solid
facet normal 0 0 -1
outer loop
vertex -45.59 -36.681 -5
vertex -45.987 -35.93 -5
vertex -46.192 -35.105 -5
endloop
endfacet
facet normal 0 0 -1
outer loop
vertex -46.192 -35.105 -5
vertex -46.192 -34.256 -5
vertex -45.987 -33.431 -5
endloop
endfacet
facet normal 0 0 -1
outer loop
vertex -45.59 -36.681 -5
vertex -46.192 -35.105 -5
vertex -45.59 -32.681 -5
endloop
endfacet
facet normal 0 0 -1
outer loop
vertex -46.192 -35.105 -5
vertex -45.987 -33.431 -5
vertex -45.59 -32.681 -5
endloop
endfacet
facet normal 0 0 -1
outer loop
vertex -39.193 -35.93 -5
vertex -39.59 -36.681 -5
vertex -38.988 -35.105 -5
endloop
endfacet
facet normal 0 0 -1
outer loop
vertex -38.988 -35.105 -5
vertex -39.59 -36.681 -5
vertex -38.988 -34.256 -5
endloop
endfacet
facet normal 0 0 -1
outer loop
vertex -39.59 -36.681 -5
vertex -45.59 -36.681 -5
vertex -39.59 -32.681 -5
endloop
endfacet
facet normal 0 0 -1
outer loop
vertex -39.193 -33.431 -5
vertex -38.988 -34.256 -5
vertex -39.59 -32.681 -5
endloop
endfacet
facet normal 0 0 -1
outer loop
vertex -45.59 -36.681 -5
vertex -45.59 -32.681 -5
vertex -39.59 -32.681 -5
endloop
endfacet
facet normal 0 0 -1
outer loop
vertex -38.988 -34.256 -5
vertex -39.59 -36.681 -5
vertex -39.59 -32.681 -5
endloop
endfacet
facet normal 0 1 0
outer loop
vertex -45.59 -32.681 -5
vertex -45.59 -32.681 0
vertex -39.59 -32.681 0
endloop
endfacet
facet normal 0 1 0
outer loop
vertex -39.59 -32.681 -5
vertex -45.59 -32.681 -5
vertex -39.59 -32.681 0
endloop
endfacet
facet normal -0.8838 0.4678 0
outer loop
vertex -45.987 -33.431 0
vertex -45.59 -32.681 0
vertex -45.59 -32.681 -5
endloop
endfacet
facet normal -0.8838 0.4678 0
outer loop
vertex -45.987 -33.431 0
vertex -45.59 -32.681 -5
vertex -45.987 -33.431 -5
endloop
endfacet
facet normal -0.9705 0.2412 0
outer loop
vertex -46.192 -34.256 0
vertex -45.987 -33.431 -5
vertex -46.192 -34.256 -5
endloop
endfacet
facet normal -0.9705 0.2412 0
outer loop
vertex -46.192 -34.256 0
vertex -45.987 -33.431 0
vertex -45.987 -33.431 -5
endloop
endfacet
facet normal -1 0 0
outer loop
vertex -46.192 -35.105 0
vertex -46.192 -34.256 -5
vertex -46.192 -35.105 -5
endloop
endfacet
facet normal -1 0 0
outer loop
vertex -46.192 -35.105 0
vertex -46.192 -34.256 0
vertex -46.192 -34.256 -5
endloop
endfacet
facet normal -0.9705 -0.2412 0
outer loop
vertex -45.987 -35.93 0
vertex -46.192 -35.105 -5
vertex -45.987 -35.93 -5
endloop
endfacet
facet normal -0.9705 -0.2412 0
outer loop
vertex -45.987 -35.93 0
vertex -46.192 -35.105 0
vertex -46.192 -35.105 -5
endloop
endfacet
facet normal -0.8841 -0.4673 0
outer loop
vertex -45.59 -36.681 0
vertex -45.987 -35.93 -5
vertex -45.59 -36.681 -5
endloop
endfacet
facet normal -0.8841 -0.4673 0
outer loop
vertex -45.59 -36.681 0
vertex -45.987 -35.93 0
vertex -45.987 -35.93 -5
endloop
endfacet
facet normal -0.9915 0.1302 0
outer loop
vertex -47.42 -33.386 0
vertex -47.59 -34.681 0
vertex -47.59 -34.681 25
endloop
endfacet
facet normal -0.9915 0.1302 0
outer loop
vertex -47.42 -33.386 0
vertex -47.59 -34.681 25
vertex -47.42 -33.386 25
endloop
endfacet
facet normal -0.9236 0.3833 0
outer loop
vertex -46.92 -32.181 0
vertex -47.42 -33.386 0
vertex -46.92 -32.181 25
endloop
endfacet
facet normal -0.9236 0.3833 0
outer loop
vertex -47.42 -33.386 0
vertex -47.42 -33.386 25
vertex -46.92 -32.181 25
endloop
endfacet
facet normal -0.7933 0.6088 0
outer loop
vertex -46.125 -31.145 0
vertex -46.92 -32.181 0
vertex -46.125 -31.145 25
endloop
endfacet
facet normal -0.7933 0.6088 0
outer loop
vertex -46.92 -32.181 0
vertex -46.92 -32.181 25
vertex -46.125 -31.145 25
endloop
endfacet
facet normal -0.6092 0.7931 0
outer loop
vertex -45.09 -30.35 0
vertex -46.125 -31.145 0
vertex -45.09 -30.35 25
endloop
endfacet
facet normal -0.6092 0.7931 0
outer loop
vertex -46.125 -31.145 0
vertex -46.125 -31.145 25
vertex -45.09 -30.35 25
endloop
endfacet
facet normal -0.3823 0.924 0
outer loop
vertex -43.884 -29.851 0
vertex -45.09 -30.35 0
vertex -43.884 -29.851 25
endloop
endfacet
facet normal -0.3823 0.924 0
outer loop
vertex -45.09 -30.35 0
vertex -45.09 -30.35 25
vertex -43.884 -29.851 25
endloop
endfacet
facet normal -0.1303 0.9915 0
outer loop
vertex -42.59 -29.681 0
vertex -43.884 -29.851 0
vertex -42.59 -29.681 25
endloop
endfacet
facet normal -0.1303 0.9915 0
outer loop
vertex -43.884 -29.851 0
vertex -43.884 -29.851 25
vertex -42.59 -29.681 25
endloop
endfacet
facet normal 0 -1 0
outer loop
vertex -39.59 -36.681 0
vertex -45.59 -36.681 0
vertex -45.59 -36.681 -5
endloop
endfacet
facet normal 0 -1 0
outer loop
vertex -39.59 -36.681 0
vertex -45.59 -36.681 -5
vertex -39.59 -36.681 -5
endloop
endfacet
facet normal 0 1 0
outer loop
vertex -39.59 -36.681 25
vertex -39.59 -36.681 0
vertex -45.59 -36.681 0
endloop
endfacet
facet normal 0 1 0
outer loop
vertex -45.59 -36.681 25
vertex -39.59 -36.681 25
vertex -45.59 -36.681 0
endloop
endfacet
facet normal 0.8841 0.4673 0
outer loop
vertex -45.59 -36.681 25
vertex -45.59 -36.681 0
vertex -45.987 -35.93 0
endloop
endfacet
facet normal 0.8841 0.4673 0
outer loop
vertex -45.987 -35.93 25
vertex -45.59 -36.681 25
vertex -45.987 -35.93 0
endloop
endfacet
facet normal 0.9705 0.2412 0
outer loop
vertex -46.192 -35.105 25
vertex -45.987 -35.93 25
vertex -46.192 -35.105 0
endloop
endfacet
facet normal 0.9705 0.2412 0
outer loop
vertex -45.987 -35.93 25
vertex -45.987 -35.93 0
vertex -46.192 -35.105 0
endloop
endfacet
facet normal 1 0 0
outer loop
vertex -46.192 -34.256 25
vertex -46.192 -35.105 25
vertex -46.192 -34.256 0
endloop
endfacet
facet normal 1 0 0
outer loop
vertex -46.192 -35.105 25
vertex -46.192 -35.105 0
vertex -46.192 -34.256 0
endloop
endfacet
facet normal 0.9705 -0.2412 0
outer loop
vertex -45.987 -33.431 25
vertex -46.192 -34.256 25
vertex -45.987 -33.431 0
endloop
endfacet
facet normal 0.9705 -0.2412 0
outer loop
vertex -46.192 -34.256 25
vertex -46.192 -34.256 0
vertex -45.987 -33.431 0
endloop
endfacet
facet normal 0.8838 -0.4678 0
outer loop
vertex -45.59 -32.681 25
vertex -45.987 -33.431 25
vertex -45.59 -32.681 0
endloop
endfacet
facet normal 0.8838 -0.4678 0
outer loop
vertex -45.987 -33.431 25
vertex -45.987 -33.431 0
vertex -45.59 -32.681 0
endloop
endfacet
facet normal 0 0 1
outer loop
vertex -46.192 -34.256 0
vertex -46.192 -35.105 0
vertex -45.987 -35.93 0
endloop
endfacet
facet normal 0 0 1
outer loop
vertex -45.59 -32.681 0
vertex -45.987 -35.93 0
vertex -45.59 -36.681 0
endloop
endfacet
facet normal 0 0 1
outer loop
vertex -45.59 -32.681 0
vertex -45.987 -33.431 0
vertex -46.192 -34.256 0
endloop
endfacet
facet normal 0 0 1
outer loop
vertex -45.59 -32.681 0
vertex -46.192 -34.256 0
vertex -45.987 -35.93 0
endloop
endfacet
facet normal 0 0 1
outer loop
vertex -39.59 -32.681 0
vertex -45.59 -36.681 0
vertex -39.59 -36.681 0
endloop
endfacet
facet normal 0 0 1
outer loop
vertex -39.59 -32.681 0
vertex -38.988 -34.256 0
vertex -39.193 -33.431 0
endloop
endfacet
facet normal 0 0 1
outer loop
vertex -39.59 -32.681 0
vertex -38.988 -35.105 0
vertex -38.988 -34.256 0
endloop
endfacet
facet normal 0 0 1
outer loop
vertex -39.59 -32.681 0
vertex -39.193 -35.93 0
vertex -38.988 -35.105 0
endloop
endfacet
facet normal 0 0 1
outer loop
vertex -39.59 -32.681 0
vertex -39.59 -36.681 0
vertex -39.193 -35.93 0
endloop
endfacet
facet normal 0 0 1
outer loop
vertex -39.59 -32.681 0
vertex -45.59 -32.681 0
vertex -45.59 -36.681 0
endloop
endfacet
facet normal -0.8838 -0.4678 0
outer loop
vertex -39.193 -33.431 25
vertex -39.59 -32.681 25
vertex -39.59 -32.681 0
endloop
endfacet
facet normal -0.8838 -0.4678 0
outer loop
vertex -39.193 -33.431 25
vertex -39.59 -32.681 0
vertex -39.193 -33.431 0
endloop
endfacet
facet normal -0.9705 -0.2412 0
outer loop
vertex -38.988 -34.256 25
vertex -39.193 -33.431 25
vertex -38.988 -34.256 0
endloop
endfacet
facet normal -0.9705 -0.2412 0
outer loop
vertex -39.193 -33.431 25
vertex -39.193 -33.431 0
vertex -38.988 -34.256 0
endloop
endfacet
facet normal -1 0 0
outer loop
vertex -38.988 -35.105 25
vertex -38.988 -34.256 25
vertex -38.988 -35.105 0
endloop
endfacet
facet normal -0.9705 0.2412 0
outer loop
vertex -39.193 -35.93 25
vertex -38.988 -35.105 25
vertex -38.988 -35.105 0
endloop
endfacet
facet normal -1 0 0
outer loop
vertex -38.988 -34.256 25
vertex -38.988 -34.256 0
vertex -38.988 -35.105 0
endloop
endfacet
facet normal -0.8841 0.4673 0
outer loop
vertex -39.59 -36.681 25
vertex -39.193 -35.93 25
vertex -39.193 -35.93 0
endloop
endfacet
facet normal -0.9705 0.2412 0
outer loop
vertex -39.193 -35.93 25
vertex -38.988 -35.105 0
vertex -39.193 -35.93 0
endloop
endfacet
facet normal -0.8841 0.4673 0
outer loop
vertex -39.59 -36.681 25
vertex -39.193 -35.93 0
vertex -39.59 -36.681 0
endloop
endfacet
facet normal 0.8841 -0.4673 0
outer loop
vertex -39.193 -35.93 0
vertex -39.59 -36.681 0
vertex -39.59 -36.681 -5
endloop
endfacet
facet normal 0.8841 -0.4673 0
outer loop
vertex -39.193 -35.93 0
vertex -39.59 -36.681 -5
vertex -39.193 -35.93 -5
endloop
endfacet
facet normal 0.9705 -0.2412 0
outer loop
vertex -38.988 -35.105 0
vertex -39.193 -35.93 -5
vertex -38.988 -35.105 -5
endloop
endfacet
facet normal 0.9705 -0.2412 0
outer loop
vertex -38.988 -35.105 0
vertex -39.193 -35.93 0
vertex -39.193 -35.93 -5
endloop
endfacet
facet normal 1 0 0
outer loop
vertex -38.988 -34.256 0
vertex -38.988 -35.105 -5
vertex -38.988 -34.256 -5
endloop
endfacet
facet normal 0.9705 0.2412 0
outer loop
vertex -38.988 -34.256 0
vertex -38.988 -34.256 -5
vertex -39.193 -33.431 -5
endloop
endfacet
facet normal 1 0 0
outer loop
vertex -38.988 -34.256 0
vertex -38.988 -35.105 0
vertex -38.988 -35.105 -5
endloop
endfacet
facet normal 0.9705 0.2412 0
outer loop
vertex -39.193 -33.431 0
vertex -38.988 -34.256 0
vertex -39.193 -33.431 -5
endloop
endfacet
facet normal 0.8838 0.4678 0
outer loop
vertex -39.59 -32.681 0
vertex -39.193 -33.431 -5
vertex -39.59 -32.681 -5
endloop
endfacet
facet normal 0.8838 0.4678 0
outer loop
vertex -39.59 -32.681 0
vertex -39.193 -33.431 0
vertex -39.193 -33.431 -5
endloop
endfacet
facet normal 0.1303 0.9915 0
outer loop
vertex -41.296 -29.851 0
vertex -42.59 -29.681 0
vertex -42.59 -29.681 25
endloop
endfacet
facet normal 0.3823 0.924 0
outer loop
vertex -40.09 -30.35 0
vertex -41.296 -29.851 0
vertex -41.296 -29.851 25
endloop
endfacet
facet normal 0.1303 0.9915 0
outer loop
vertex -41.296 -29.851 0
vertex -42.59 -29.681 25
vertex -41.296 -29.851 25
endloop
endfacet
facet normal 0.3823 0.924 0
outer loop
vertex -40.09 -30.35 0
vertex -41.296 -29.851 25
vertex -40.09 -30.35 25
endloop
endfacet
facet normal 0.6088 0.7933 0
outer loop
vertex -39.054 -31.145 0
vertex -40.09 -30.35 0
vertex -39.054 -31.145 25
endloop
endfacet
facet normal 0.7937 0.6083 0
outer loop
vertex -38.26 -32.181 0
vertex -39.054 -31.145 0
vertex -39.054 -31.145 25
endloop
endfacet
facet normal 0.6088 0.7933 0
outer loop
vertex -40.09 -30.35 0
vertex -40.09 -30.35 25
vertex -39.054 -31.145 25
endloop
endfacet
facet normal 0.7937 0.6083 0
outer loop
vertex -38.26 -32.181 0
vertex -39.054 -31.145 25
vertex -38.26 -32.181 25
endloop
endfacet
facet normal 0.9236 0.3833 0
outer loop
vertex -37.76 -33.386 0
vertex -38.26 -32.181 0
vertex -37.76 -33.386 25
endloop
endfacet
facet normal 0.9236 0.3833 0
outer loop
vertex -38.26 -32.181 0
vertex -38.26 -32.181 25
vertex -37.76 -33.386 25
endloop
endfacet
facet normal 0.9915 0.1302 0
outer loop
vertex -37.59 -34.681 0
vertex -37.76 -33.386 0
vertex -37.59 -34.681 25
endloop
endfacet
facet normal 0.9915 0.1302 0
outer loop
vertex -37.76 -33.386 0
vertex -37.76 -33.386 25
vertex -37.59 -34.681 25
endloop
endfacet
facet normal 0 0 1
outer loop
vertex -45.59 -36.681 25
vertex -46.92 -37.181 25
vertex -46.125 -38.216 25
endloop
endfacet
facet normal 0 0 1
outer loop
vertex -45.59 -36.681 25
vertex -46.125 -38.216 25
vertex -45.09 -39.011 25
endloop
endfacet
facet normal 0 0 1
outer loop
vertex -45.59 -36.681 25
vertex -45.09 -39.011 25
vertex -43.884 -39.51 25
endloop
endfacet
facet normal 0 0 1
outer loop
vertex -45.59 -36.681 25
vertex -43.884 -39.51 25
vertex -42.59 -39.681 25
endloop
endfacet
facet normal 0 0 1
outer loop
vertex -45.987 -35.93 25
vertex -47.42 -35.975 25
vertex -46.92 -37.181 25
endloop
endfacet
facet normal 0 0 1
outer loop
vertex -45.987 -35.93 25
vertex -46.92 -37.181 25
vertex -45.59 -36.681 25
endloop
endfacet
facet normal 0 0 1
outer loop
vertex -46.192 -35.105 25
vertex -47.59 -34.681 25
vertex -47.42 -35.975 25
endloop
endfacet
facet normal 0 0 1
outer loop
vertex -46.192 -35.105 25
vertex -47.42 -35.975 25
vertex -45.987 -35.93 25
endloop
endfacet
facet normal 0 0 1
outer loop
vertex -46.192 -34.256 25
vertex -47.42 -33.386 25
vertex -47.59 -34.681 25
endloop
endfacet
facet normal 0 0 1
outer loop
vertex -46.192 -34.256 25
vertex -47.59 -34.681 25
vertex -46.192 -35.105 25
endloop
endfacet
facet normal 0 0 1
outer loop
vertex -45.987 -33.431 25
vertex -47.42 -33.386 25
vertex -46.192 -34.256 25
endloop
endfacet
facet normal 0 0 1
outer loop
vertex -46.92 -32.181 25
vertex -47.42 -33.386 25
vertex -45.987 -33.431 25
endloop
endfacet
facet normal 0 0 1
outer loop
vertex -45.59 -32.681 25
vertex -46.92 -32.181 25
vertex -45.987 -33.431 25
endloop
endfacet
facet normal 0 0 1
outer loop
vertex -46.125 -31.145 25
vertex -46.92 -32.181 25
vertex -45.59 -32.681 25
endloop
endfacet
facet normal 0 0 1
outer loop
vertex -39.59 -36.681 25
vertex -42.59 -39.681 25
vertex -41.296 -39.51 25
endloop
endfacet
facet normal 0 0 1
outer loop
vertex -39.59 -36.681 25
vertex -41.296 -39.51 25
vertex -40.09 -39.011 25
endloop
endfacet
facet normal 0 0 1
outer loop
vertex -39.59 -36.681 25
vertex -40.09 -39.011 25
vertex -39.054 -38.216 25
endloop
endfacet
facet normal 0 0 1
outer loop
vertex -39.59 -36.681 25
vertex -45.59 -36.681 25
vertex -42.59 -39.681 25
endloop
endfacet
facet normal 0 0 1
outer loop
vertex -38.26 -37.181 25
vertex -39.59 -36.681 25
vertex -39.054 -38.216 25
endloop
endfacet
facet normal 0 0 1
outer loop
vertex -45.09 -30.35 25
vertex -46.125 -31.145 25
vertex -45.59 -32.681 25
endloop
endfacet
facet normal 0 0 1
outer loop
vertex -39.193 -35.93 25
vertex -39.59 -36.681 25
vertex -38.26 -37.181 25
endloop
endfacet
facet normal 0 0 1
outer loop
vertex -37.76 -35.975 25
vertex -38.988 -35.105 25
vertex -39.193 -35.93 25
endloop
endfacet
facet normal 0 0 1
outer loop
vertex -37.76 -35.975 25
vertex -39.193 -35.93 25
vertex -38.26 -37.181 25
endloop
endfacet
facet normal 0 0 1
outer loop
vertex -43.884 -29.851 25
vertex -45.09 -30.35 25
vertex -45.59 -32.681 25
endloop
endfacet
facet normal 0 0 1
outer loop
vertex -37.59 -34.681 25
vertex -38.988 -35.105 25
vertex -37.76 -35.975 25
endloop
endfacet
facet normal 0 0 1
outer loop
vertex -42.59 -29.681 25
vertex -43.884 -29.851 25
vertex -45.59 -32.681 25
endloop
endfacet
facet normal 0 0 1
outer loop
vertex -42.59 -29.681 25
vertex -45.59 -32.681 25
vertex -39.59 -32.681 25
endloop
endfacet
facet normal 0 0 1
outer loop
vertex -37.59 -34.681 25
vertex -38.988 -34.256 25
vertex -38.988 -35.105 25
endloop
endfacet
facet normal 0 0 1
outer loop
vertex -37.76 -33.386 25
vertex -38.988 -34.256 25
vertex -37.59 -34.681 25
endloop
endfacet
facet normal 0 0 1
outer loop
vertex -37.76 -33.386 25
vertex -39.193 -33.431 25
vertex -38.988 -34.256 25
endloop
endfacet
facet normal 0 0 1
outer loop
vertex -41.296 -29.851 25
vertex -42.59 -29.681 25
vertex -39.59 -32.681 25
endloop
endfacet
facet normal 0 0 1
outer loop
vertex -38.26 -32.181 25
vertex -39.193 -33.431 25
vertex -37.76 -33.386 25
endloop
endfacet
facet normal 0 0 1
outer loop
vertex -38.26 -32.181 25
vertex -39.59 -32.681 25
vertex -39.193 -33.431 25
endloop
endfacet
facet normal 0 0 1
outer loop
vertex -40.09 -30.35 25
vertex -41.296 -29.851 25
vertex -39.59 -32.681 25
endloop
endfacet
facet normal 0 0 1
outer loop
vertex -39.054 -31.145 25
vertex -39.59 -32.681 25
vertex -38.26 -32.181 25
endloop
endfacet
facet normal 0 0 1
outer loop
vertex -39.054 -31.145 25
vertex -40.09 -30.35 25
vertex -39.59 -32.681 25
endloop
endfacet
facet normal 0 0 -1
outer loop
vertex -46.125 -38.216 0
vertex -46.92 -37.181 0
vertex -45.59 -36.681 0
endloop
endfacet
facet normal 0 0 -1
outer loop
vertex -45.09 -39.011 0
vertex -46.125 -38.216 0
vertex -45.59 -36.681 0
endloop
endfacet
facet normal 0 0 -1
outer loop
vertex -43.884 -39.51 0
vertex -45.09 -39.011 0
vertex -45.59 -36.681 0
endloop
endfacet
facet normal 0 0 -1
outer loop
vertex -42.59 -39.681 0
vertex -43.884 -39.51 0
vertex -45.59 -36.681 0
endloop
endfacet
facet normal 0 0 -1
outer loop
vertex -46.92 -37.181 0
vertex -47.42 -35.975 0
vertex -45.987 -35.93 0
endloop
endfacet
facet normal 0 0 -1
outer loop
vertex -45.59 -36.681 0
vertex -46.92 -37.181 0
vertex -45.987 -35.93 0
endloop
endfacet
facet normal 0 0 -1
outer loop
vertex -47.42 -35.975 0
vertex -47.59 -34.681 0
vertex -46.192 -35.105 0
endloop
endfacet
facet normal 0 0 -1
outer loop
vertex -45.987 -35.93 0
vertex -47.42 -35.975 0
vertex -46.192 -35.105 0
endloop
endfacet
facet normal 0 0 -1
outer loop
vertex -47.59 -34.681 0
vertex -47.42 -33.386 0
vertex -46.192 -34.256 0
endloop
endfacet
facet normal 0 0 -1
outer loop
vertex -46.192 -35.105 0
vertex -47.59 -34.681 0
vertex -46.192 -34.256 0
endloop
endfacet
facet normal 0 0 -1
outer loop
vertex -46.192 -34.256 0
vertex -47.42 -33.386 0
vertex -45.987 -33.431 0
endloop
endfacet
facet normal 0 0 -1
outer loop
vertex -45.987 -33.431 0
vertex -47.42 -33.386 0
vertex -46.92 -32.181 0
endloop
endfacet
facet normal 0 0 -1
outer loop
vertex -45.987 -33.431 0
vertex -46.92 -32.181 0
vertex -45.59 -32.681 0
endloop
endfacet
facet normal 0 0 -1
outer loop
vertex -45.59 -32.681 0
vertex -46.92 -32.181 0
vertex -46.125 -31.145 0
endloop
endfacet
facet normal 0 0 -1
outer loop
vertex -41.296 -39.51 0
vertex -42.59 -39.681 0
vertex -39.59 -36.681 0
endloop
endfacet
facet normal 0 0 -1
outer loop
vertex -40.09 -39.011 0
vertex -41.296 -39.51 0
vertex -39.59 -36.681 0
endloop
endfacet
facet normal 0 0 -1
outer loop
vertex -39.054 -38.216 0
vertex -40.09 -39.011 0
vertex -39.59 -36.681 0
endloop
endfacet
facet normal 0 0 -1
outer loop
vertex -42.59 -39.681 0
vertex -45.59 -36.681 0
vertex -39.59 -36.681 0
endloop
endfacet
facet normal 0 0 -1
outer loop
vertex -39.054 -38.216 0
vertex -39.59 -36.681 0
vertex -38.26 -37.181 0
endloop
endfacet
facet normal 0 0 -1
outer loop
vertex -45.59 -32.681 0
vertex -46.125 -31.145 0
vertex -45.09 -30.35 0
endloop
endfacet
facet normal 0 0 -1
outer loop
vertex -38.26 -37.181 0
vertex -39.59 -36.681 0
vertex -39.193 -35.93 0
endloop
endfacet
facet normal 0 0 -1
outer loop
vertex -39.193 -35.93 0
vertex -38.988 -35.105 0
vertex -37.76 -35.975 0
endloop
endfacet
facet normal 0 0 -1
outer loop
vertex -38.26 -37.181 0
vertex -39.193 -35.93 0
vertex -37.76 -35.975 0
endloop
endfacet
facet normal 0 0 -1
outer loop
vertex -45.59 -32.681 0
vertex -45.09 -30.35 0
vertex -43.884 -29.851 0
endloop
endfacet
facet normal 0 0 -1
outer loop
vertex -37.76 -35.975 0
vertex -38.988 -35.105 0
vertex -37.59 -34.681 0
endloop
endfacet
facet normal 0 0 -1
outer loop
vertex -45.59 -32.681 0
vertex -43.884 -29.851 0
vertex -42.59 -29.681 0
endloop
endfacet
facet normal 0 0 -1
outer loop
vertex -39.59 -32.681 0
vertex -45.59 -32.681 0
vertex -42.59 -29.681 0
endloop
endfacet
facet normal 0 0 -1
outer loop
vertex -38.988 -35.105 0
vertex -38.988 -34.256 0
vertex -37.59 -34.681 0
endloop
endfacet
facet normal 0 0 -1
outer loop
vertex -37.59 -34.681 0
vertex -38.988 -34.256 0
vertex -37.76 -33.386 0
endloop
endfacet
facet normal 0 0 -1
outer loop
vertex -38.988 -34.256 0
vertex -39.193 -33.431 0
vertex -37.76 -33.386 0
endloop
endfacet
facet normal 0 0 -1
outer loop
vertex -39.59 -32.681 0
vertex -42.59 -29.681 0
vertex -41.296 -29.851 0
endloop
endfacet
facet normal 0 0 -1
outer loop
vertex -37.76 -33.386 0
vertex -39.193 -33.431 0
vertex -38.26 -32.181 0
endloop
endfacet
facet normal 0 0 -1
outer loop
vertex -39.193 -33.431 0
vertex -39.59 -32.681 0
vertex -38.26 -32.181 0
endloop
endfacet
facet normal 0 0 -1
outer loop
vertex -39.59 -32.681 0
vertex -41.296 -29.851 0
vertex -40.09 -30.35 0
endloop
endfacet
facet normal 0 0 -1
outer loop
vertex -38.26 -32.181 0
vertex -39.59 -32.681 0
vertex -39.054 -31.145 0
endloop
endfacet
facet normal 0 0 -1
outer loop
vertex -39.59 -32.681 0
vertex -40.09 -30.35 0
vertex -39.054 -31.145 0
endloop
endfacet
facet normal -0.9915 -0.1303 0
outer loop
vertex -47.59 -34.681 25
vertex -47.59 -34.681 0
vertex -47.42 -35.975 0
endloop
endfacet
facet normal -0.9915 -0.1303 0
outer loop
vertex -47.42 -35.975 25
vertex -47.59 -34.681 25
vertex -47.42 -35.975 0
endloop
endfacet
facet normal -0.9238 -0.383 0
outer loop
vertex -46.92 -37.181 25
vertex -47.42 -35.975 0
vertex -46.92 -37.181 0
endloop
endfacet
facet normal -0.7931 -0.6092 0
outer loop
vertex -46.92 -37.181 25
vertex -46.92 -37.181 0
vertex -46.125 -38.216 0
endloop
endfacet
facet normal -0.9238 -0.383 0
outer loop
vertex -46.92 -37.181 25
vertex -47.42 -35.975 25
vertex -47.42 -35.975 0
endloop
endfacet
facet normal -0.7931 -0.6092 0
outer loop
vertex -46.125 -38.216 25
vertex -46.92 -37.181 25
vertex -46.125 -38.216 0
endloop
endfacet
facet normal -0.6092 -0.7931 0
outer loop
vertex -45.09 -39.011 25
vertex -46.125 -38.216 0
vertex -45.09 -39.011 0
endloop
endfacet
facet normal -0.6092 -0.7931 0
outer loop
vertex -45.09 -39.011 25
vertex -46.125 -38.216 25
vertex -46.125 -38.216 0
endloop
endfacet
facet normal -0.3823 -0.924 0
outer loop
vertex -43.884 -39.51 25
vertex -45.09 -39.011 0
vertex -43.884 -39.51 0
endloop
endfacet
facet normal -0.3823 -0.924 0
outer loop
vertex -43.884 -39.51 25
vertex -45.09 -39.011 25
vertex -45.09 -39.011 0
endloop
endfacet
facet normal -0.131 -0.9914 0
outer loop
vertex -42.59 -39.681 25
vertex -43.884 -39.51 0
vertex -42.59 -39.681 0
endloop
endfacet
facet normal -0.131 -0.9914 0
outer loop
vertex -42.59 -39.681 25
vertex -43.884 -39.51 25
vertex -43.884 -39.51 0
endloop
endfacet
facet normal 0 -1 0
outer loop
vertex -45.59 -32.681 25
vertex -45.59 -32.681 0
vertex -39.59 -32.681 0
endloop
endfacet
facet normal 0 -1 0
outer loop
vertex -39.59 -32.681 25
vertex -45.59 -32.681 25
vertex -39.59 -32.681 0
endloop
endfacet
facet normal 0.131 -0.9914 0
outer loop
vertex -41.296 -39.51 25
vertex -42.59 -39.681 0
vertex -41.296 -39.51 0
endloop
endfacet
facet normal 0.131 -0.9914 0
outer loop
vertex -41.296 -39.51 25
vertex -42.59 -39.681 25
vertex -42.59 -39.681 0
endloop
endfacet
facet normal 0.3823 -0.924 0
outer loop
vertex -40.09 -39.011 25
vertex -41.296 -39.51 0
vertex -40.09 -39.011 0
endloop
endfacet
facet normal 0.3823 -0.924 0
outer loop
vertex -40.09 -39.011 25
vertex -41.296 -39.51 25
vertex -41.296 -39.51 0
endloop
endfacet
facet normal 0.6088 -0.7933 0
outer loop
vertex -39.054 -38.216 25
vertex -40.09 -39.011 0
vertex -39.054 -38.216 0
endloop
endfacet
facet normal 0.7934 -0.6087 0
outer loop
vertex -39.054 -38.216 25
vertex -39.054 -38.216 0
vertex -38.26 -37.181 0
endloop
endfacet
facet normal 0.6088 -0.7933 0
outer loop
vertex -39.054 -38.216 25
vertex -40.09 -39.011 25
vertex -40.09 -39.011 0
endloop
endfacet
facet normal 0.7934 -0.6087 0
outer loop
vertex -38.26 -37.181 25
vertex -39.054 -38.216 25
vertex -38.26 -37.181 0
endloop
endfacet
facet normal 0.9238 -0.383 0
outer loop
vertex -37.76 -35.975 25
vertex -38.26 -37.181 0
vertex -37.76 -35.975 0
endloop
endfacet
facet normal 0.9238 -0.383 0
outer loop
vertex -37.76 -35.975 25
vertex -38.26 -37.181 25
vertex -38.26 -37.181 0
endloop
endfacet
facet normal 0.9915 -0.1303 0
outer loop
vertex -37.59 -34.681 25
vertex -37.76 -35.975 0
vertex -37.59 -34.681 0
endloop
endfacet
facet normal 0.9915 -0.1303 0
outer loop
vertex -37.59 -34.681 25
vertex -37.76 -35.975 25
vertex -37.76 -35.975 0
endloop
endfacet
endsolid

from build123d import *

# Parameters (mm, degrees)
F0_W     = 10
F0_H     = 10
F1_DEPTH = 25
F2_R     = 4.99999
F0_W_2   = 6
F0_H_2   = 4
F3_DEPTH = 5


# Not quite as in the source:
# - a fillet or chamfer is up to 0.001 mm smaller than in the source, because OpenCascade refuses the exact size


with BuildPart() as f1:
    # F0 (on Top) → F1 (new body)
    with BuildSketch(Plane.XY):
        with Locations((-42.5899140537, -34.680514973)):
            Rectangle(F0_W, F0_H)
        with BuildLine():
            ThreePointArc((-45.5899140537, -36.680514973), (-46.2176327304, -34.680514973), (-45.5899140537, -32.680514973))
            Line((-45.5899140537, -32.680514973), (-39.5899140537, -32.680514973))
            ThreePointArc((-39.5899140537, -32.680514973), (-38.9621953769, -34.680514973), (-39.5899140537, -36.680514973))
            Line((-39.5899140537, -36.680514973), (-45.5899140537, -36.680514973))
        make_face(mode=Mode.SUBTRACT)
    extrude(amount=F1_DEPTH)

    # F2 (radius 5 in the source; OpenCascade refuses exactly that, so slightly less here)
    f2_edges = [f1.edges().sort_by_distance(p)[0] for p in [
        (-37.589914, -39.680515, 12.5),
        (-37.589914, -29.680515, 12.5),
        (-47.589914, -39.680515, 12.5),
        (-47.589914, -29.680515, 12.5),
    ]]
    fillet(f2_edges, radius=F2_R)

    # F0 (on Top) → F3 (join)
    with BuildSketch(Plane.XY):
        with Locations((-42.5899140537, -34.680514973)):
            Rectangle(F0_W_2, F0_H_2)
        with BuildLine():
            Line((-45.5899140537, -36.680514973), (-45.5899140537, -32.680514973))
            ThreePointArc((-45.5899140537, -32.680514973), (-46.2176327304, -34.680514973), (-45.5899140537, -36.680514973))
        make_face()
        with BuildLine():
            ThreePointArc((-39.5899140537, -36.680514973), (-38.9621953769, -34.680514973), (-39.5899140537, -32.680514973))
            Line((-39.5899140537, -32.680514973), (-39.5899140537, -36.680514973))
        make_face()
    extrude(amount=-F3_DEPTH)


solid = f1.part
